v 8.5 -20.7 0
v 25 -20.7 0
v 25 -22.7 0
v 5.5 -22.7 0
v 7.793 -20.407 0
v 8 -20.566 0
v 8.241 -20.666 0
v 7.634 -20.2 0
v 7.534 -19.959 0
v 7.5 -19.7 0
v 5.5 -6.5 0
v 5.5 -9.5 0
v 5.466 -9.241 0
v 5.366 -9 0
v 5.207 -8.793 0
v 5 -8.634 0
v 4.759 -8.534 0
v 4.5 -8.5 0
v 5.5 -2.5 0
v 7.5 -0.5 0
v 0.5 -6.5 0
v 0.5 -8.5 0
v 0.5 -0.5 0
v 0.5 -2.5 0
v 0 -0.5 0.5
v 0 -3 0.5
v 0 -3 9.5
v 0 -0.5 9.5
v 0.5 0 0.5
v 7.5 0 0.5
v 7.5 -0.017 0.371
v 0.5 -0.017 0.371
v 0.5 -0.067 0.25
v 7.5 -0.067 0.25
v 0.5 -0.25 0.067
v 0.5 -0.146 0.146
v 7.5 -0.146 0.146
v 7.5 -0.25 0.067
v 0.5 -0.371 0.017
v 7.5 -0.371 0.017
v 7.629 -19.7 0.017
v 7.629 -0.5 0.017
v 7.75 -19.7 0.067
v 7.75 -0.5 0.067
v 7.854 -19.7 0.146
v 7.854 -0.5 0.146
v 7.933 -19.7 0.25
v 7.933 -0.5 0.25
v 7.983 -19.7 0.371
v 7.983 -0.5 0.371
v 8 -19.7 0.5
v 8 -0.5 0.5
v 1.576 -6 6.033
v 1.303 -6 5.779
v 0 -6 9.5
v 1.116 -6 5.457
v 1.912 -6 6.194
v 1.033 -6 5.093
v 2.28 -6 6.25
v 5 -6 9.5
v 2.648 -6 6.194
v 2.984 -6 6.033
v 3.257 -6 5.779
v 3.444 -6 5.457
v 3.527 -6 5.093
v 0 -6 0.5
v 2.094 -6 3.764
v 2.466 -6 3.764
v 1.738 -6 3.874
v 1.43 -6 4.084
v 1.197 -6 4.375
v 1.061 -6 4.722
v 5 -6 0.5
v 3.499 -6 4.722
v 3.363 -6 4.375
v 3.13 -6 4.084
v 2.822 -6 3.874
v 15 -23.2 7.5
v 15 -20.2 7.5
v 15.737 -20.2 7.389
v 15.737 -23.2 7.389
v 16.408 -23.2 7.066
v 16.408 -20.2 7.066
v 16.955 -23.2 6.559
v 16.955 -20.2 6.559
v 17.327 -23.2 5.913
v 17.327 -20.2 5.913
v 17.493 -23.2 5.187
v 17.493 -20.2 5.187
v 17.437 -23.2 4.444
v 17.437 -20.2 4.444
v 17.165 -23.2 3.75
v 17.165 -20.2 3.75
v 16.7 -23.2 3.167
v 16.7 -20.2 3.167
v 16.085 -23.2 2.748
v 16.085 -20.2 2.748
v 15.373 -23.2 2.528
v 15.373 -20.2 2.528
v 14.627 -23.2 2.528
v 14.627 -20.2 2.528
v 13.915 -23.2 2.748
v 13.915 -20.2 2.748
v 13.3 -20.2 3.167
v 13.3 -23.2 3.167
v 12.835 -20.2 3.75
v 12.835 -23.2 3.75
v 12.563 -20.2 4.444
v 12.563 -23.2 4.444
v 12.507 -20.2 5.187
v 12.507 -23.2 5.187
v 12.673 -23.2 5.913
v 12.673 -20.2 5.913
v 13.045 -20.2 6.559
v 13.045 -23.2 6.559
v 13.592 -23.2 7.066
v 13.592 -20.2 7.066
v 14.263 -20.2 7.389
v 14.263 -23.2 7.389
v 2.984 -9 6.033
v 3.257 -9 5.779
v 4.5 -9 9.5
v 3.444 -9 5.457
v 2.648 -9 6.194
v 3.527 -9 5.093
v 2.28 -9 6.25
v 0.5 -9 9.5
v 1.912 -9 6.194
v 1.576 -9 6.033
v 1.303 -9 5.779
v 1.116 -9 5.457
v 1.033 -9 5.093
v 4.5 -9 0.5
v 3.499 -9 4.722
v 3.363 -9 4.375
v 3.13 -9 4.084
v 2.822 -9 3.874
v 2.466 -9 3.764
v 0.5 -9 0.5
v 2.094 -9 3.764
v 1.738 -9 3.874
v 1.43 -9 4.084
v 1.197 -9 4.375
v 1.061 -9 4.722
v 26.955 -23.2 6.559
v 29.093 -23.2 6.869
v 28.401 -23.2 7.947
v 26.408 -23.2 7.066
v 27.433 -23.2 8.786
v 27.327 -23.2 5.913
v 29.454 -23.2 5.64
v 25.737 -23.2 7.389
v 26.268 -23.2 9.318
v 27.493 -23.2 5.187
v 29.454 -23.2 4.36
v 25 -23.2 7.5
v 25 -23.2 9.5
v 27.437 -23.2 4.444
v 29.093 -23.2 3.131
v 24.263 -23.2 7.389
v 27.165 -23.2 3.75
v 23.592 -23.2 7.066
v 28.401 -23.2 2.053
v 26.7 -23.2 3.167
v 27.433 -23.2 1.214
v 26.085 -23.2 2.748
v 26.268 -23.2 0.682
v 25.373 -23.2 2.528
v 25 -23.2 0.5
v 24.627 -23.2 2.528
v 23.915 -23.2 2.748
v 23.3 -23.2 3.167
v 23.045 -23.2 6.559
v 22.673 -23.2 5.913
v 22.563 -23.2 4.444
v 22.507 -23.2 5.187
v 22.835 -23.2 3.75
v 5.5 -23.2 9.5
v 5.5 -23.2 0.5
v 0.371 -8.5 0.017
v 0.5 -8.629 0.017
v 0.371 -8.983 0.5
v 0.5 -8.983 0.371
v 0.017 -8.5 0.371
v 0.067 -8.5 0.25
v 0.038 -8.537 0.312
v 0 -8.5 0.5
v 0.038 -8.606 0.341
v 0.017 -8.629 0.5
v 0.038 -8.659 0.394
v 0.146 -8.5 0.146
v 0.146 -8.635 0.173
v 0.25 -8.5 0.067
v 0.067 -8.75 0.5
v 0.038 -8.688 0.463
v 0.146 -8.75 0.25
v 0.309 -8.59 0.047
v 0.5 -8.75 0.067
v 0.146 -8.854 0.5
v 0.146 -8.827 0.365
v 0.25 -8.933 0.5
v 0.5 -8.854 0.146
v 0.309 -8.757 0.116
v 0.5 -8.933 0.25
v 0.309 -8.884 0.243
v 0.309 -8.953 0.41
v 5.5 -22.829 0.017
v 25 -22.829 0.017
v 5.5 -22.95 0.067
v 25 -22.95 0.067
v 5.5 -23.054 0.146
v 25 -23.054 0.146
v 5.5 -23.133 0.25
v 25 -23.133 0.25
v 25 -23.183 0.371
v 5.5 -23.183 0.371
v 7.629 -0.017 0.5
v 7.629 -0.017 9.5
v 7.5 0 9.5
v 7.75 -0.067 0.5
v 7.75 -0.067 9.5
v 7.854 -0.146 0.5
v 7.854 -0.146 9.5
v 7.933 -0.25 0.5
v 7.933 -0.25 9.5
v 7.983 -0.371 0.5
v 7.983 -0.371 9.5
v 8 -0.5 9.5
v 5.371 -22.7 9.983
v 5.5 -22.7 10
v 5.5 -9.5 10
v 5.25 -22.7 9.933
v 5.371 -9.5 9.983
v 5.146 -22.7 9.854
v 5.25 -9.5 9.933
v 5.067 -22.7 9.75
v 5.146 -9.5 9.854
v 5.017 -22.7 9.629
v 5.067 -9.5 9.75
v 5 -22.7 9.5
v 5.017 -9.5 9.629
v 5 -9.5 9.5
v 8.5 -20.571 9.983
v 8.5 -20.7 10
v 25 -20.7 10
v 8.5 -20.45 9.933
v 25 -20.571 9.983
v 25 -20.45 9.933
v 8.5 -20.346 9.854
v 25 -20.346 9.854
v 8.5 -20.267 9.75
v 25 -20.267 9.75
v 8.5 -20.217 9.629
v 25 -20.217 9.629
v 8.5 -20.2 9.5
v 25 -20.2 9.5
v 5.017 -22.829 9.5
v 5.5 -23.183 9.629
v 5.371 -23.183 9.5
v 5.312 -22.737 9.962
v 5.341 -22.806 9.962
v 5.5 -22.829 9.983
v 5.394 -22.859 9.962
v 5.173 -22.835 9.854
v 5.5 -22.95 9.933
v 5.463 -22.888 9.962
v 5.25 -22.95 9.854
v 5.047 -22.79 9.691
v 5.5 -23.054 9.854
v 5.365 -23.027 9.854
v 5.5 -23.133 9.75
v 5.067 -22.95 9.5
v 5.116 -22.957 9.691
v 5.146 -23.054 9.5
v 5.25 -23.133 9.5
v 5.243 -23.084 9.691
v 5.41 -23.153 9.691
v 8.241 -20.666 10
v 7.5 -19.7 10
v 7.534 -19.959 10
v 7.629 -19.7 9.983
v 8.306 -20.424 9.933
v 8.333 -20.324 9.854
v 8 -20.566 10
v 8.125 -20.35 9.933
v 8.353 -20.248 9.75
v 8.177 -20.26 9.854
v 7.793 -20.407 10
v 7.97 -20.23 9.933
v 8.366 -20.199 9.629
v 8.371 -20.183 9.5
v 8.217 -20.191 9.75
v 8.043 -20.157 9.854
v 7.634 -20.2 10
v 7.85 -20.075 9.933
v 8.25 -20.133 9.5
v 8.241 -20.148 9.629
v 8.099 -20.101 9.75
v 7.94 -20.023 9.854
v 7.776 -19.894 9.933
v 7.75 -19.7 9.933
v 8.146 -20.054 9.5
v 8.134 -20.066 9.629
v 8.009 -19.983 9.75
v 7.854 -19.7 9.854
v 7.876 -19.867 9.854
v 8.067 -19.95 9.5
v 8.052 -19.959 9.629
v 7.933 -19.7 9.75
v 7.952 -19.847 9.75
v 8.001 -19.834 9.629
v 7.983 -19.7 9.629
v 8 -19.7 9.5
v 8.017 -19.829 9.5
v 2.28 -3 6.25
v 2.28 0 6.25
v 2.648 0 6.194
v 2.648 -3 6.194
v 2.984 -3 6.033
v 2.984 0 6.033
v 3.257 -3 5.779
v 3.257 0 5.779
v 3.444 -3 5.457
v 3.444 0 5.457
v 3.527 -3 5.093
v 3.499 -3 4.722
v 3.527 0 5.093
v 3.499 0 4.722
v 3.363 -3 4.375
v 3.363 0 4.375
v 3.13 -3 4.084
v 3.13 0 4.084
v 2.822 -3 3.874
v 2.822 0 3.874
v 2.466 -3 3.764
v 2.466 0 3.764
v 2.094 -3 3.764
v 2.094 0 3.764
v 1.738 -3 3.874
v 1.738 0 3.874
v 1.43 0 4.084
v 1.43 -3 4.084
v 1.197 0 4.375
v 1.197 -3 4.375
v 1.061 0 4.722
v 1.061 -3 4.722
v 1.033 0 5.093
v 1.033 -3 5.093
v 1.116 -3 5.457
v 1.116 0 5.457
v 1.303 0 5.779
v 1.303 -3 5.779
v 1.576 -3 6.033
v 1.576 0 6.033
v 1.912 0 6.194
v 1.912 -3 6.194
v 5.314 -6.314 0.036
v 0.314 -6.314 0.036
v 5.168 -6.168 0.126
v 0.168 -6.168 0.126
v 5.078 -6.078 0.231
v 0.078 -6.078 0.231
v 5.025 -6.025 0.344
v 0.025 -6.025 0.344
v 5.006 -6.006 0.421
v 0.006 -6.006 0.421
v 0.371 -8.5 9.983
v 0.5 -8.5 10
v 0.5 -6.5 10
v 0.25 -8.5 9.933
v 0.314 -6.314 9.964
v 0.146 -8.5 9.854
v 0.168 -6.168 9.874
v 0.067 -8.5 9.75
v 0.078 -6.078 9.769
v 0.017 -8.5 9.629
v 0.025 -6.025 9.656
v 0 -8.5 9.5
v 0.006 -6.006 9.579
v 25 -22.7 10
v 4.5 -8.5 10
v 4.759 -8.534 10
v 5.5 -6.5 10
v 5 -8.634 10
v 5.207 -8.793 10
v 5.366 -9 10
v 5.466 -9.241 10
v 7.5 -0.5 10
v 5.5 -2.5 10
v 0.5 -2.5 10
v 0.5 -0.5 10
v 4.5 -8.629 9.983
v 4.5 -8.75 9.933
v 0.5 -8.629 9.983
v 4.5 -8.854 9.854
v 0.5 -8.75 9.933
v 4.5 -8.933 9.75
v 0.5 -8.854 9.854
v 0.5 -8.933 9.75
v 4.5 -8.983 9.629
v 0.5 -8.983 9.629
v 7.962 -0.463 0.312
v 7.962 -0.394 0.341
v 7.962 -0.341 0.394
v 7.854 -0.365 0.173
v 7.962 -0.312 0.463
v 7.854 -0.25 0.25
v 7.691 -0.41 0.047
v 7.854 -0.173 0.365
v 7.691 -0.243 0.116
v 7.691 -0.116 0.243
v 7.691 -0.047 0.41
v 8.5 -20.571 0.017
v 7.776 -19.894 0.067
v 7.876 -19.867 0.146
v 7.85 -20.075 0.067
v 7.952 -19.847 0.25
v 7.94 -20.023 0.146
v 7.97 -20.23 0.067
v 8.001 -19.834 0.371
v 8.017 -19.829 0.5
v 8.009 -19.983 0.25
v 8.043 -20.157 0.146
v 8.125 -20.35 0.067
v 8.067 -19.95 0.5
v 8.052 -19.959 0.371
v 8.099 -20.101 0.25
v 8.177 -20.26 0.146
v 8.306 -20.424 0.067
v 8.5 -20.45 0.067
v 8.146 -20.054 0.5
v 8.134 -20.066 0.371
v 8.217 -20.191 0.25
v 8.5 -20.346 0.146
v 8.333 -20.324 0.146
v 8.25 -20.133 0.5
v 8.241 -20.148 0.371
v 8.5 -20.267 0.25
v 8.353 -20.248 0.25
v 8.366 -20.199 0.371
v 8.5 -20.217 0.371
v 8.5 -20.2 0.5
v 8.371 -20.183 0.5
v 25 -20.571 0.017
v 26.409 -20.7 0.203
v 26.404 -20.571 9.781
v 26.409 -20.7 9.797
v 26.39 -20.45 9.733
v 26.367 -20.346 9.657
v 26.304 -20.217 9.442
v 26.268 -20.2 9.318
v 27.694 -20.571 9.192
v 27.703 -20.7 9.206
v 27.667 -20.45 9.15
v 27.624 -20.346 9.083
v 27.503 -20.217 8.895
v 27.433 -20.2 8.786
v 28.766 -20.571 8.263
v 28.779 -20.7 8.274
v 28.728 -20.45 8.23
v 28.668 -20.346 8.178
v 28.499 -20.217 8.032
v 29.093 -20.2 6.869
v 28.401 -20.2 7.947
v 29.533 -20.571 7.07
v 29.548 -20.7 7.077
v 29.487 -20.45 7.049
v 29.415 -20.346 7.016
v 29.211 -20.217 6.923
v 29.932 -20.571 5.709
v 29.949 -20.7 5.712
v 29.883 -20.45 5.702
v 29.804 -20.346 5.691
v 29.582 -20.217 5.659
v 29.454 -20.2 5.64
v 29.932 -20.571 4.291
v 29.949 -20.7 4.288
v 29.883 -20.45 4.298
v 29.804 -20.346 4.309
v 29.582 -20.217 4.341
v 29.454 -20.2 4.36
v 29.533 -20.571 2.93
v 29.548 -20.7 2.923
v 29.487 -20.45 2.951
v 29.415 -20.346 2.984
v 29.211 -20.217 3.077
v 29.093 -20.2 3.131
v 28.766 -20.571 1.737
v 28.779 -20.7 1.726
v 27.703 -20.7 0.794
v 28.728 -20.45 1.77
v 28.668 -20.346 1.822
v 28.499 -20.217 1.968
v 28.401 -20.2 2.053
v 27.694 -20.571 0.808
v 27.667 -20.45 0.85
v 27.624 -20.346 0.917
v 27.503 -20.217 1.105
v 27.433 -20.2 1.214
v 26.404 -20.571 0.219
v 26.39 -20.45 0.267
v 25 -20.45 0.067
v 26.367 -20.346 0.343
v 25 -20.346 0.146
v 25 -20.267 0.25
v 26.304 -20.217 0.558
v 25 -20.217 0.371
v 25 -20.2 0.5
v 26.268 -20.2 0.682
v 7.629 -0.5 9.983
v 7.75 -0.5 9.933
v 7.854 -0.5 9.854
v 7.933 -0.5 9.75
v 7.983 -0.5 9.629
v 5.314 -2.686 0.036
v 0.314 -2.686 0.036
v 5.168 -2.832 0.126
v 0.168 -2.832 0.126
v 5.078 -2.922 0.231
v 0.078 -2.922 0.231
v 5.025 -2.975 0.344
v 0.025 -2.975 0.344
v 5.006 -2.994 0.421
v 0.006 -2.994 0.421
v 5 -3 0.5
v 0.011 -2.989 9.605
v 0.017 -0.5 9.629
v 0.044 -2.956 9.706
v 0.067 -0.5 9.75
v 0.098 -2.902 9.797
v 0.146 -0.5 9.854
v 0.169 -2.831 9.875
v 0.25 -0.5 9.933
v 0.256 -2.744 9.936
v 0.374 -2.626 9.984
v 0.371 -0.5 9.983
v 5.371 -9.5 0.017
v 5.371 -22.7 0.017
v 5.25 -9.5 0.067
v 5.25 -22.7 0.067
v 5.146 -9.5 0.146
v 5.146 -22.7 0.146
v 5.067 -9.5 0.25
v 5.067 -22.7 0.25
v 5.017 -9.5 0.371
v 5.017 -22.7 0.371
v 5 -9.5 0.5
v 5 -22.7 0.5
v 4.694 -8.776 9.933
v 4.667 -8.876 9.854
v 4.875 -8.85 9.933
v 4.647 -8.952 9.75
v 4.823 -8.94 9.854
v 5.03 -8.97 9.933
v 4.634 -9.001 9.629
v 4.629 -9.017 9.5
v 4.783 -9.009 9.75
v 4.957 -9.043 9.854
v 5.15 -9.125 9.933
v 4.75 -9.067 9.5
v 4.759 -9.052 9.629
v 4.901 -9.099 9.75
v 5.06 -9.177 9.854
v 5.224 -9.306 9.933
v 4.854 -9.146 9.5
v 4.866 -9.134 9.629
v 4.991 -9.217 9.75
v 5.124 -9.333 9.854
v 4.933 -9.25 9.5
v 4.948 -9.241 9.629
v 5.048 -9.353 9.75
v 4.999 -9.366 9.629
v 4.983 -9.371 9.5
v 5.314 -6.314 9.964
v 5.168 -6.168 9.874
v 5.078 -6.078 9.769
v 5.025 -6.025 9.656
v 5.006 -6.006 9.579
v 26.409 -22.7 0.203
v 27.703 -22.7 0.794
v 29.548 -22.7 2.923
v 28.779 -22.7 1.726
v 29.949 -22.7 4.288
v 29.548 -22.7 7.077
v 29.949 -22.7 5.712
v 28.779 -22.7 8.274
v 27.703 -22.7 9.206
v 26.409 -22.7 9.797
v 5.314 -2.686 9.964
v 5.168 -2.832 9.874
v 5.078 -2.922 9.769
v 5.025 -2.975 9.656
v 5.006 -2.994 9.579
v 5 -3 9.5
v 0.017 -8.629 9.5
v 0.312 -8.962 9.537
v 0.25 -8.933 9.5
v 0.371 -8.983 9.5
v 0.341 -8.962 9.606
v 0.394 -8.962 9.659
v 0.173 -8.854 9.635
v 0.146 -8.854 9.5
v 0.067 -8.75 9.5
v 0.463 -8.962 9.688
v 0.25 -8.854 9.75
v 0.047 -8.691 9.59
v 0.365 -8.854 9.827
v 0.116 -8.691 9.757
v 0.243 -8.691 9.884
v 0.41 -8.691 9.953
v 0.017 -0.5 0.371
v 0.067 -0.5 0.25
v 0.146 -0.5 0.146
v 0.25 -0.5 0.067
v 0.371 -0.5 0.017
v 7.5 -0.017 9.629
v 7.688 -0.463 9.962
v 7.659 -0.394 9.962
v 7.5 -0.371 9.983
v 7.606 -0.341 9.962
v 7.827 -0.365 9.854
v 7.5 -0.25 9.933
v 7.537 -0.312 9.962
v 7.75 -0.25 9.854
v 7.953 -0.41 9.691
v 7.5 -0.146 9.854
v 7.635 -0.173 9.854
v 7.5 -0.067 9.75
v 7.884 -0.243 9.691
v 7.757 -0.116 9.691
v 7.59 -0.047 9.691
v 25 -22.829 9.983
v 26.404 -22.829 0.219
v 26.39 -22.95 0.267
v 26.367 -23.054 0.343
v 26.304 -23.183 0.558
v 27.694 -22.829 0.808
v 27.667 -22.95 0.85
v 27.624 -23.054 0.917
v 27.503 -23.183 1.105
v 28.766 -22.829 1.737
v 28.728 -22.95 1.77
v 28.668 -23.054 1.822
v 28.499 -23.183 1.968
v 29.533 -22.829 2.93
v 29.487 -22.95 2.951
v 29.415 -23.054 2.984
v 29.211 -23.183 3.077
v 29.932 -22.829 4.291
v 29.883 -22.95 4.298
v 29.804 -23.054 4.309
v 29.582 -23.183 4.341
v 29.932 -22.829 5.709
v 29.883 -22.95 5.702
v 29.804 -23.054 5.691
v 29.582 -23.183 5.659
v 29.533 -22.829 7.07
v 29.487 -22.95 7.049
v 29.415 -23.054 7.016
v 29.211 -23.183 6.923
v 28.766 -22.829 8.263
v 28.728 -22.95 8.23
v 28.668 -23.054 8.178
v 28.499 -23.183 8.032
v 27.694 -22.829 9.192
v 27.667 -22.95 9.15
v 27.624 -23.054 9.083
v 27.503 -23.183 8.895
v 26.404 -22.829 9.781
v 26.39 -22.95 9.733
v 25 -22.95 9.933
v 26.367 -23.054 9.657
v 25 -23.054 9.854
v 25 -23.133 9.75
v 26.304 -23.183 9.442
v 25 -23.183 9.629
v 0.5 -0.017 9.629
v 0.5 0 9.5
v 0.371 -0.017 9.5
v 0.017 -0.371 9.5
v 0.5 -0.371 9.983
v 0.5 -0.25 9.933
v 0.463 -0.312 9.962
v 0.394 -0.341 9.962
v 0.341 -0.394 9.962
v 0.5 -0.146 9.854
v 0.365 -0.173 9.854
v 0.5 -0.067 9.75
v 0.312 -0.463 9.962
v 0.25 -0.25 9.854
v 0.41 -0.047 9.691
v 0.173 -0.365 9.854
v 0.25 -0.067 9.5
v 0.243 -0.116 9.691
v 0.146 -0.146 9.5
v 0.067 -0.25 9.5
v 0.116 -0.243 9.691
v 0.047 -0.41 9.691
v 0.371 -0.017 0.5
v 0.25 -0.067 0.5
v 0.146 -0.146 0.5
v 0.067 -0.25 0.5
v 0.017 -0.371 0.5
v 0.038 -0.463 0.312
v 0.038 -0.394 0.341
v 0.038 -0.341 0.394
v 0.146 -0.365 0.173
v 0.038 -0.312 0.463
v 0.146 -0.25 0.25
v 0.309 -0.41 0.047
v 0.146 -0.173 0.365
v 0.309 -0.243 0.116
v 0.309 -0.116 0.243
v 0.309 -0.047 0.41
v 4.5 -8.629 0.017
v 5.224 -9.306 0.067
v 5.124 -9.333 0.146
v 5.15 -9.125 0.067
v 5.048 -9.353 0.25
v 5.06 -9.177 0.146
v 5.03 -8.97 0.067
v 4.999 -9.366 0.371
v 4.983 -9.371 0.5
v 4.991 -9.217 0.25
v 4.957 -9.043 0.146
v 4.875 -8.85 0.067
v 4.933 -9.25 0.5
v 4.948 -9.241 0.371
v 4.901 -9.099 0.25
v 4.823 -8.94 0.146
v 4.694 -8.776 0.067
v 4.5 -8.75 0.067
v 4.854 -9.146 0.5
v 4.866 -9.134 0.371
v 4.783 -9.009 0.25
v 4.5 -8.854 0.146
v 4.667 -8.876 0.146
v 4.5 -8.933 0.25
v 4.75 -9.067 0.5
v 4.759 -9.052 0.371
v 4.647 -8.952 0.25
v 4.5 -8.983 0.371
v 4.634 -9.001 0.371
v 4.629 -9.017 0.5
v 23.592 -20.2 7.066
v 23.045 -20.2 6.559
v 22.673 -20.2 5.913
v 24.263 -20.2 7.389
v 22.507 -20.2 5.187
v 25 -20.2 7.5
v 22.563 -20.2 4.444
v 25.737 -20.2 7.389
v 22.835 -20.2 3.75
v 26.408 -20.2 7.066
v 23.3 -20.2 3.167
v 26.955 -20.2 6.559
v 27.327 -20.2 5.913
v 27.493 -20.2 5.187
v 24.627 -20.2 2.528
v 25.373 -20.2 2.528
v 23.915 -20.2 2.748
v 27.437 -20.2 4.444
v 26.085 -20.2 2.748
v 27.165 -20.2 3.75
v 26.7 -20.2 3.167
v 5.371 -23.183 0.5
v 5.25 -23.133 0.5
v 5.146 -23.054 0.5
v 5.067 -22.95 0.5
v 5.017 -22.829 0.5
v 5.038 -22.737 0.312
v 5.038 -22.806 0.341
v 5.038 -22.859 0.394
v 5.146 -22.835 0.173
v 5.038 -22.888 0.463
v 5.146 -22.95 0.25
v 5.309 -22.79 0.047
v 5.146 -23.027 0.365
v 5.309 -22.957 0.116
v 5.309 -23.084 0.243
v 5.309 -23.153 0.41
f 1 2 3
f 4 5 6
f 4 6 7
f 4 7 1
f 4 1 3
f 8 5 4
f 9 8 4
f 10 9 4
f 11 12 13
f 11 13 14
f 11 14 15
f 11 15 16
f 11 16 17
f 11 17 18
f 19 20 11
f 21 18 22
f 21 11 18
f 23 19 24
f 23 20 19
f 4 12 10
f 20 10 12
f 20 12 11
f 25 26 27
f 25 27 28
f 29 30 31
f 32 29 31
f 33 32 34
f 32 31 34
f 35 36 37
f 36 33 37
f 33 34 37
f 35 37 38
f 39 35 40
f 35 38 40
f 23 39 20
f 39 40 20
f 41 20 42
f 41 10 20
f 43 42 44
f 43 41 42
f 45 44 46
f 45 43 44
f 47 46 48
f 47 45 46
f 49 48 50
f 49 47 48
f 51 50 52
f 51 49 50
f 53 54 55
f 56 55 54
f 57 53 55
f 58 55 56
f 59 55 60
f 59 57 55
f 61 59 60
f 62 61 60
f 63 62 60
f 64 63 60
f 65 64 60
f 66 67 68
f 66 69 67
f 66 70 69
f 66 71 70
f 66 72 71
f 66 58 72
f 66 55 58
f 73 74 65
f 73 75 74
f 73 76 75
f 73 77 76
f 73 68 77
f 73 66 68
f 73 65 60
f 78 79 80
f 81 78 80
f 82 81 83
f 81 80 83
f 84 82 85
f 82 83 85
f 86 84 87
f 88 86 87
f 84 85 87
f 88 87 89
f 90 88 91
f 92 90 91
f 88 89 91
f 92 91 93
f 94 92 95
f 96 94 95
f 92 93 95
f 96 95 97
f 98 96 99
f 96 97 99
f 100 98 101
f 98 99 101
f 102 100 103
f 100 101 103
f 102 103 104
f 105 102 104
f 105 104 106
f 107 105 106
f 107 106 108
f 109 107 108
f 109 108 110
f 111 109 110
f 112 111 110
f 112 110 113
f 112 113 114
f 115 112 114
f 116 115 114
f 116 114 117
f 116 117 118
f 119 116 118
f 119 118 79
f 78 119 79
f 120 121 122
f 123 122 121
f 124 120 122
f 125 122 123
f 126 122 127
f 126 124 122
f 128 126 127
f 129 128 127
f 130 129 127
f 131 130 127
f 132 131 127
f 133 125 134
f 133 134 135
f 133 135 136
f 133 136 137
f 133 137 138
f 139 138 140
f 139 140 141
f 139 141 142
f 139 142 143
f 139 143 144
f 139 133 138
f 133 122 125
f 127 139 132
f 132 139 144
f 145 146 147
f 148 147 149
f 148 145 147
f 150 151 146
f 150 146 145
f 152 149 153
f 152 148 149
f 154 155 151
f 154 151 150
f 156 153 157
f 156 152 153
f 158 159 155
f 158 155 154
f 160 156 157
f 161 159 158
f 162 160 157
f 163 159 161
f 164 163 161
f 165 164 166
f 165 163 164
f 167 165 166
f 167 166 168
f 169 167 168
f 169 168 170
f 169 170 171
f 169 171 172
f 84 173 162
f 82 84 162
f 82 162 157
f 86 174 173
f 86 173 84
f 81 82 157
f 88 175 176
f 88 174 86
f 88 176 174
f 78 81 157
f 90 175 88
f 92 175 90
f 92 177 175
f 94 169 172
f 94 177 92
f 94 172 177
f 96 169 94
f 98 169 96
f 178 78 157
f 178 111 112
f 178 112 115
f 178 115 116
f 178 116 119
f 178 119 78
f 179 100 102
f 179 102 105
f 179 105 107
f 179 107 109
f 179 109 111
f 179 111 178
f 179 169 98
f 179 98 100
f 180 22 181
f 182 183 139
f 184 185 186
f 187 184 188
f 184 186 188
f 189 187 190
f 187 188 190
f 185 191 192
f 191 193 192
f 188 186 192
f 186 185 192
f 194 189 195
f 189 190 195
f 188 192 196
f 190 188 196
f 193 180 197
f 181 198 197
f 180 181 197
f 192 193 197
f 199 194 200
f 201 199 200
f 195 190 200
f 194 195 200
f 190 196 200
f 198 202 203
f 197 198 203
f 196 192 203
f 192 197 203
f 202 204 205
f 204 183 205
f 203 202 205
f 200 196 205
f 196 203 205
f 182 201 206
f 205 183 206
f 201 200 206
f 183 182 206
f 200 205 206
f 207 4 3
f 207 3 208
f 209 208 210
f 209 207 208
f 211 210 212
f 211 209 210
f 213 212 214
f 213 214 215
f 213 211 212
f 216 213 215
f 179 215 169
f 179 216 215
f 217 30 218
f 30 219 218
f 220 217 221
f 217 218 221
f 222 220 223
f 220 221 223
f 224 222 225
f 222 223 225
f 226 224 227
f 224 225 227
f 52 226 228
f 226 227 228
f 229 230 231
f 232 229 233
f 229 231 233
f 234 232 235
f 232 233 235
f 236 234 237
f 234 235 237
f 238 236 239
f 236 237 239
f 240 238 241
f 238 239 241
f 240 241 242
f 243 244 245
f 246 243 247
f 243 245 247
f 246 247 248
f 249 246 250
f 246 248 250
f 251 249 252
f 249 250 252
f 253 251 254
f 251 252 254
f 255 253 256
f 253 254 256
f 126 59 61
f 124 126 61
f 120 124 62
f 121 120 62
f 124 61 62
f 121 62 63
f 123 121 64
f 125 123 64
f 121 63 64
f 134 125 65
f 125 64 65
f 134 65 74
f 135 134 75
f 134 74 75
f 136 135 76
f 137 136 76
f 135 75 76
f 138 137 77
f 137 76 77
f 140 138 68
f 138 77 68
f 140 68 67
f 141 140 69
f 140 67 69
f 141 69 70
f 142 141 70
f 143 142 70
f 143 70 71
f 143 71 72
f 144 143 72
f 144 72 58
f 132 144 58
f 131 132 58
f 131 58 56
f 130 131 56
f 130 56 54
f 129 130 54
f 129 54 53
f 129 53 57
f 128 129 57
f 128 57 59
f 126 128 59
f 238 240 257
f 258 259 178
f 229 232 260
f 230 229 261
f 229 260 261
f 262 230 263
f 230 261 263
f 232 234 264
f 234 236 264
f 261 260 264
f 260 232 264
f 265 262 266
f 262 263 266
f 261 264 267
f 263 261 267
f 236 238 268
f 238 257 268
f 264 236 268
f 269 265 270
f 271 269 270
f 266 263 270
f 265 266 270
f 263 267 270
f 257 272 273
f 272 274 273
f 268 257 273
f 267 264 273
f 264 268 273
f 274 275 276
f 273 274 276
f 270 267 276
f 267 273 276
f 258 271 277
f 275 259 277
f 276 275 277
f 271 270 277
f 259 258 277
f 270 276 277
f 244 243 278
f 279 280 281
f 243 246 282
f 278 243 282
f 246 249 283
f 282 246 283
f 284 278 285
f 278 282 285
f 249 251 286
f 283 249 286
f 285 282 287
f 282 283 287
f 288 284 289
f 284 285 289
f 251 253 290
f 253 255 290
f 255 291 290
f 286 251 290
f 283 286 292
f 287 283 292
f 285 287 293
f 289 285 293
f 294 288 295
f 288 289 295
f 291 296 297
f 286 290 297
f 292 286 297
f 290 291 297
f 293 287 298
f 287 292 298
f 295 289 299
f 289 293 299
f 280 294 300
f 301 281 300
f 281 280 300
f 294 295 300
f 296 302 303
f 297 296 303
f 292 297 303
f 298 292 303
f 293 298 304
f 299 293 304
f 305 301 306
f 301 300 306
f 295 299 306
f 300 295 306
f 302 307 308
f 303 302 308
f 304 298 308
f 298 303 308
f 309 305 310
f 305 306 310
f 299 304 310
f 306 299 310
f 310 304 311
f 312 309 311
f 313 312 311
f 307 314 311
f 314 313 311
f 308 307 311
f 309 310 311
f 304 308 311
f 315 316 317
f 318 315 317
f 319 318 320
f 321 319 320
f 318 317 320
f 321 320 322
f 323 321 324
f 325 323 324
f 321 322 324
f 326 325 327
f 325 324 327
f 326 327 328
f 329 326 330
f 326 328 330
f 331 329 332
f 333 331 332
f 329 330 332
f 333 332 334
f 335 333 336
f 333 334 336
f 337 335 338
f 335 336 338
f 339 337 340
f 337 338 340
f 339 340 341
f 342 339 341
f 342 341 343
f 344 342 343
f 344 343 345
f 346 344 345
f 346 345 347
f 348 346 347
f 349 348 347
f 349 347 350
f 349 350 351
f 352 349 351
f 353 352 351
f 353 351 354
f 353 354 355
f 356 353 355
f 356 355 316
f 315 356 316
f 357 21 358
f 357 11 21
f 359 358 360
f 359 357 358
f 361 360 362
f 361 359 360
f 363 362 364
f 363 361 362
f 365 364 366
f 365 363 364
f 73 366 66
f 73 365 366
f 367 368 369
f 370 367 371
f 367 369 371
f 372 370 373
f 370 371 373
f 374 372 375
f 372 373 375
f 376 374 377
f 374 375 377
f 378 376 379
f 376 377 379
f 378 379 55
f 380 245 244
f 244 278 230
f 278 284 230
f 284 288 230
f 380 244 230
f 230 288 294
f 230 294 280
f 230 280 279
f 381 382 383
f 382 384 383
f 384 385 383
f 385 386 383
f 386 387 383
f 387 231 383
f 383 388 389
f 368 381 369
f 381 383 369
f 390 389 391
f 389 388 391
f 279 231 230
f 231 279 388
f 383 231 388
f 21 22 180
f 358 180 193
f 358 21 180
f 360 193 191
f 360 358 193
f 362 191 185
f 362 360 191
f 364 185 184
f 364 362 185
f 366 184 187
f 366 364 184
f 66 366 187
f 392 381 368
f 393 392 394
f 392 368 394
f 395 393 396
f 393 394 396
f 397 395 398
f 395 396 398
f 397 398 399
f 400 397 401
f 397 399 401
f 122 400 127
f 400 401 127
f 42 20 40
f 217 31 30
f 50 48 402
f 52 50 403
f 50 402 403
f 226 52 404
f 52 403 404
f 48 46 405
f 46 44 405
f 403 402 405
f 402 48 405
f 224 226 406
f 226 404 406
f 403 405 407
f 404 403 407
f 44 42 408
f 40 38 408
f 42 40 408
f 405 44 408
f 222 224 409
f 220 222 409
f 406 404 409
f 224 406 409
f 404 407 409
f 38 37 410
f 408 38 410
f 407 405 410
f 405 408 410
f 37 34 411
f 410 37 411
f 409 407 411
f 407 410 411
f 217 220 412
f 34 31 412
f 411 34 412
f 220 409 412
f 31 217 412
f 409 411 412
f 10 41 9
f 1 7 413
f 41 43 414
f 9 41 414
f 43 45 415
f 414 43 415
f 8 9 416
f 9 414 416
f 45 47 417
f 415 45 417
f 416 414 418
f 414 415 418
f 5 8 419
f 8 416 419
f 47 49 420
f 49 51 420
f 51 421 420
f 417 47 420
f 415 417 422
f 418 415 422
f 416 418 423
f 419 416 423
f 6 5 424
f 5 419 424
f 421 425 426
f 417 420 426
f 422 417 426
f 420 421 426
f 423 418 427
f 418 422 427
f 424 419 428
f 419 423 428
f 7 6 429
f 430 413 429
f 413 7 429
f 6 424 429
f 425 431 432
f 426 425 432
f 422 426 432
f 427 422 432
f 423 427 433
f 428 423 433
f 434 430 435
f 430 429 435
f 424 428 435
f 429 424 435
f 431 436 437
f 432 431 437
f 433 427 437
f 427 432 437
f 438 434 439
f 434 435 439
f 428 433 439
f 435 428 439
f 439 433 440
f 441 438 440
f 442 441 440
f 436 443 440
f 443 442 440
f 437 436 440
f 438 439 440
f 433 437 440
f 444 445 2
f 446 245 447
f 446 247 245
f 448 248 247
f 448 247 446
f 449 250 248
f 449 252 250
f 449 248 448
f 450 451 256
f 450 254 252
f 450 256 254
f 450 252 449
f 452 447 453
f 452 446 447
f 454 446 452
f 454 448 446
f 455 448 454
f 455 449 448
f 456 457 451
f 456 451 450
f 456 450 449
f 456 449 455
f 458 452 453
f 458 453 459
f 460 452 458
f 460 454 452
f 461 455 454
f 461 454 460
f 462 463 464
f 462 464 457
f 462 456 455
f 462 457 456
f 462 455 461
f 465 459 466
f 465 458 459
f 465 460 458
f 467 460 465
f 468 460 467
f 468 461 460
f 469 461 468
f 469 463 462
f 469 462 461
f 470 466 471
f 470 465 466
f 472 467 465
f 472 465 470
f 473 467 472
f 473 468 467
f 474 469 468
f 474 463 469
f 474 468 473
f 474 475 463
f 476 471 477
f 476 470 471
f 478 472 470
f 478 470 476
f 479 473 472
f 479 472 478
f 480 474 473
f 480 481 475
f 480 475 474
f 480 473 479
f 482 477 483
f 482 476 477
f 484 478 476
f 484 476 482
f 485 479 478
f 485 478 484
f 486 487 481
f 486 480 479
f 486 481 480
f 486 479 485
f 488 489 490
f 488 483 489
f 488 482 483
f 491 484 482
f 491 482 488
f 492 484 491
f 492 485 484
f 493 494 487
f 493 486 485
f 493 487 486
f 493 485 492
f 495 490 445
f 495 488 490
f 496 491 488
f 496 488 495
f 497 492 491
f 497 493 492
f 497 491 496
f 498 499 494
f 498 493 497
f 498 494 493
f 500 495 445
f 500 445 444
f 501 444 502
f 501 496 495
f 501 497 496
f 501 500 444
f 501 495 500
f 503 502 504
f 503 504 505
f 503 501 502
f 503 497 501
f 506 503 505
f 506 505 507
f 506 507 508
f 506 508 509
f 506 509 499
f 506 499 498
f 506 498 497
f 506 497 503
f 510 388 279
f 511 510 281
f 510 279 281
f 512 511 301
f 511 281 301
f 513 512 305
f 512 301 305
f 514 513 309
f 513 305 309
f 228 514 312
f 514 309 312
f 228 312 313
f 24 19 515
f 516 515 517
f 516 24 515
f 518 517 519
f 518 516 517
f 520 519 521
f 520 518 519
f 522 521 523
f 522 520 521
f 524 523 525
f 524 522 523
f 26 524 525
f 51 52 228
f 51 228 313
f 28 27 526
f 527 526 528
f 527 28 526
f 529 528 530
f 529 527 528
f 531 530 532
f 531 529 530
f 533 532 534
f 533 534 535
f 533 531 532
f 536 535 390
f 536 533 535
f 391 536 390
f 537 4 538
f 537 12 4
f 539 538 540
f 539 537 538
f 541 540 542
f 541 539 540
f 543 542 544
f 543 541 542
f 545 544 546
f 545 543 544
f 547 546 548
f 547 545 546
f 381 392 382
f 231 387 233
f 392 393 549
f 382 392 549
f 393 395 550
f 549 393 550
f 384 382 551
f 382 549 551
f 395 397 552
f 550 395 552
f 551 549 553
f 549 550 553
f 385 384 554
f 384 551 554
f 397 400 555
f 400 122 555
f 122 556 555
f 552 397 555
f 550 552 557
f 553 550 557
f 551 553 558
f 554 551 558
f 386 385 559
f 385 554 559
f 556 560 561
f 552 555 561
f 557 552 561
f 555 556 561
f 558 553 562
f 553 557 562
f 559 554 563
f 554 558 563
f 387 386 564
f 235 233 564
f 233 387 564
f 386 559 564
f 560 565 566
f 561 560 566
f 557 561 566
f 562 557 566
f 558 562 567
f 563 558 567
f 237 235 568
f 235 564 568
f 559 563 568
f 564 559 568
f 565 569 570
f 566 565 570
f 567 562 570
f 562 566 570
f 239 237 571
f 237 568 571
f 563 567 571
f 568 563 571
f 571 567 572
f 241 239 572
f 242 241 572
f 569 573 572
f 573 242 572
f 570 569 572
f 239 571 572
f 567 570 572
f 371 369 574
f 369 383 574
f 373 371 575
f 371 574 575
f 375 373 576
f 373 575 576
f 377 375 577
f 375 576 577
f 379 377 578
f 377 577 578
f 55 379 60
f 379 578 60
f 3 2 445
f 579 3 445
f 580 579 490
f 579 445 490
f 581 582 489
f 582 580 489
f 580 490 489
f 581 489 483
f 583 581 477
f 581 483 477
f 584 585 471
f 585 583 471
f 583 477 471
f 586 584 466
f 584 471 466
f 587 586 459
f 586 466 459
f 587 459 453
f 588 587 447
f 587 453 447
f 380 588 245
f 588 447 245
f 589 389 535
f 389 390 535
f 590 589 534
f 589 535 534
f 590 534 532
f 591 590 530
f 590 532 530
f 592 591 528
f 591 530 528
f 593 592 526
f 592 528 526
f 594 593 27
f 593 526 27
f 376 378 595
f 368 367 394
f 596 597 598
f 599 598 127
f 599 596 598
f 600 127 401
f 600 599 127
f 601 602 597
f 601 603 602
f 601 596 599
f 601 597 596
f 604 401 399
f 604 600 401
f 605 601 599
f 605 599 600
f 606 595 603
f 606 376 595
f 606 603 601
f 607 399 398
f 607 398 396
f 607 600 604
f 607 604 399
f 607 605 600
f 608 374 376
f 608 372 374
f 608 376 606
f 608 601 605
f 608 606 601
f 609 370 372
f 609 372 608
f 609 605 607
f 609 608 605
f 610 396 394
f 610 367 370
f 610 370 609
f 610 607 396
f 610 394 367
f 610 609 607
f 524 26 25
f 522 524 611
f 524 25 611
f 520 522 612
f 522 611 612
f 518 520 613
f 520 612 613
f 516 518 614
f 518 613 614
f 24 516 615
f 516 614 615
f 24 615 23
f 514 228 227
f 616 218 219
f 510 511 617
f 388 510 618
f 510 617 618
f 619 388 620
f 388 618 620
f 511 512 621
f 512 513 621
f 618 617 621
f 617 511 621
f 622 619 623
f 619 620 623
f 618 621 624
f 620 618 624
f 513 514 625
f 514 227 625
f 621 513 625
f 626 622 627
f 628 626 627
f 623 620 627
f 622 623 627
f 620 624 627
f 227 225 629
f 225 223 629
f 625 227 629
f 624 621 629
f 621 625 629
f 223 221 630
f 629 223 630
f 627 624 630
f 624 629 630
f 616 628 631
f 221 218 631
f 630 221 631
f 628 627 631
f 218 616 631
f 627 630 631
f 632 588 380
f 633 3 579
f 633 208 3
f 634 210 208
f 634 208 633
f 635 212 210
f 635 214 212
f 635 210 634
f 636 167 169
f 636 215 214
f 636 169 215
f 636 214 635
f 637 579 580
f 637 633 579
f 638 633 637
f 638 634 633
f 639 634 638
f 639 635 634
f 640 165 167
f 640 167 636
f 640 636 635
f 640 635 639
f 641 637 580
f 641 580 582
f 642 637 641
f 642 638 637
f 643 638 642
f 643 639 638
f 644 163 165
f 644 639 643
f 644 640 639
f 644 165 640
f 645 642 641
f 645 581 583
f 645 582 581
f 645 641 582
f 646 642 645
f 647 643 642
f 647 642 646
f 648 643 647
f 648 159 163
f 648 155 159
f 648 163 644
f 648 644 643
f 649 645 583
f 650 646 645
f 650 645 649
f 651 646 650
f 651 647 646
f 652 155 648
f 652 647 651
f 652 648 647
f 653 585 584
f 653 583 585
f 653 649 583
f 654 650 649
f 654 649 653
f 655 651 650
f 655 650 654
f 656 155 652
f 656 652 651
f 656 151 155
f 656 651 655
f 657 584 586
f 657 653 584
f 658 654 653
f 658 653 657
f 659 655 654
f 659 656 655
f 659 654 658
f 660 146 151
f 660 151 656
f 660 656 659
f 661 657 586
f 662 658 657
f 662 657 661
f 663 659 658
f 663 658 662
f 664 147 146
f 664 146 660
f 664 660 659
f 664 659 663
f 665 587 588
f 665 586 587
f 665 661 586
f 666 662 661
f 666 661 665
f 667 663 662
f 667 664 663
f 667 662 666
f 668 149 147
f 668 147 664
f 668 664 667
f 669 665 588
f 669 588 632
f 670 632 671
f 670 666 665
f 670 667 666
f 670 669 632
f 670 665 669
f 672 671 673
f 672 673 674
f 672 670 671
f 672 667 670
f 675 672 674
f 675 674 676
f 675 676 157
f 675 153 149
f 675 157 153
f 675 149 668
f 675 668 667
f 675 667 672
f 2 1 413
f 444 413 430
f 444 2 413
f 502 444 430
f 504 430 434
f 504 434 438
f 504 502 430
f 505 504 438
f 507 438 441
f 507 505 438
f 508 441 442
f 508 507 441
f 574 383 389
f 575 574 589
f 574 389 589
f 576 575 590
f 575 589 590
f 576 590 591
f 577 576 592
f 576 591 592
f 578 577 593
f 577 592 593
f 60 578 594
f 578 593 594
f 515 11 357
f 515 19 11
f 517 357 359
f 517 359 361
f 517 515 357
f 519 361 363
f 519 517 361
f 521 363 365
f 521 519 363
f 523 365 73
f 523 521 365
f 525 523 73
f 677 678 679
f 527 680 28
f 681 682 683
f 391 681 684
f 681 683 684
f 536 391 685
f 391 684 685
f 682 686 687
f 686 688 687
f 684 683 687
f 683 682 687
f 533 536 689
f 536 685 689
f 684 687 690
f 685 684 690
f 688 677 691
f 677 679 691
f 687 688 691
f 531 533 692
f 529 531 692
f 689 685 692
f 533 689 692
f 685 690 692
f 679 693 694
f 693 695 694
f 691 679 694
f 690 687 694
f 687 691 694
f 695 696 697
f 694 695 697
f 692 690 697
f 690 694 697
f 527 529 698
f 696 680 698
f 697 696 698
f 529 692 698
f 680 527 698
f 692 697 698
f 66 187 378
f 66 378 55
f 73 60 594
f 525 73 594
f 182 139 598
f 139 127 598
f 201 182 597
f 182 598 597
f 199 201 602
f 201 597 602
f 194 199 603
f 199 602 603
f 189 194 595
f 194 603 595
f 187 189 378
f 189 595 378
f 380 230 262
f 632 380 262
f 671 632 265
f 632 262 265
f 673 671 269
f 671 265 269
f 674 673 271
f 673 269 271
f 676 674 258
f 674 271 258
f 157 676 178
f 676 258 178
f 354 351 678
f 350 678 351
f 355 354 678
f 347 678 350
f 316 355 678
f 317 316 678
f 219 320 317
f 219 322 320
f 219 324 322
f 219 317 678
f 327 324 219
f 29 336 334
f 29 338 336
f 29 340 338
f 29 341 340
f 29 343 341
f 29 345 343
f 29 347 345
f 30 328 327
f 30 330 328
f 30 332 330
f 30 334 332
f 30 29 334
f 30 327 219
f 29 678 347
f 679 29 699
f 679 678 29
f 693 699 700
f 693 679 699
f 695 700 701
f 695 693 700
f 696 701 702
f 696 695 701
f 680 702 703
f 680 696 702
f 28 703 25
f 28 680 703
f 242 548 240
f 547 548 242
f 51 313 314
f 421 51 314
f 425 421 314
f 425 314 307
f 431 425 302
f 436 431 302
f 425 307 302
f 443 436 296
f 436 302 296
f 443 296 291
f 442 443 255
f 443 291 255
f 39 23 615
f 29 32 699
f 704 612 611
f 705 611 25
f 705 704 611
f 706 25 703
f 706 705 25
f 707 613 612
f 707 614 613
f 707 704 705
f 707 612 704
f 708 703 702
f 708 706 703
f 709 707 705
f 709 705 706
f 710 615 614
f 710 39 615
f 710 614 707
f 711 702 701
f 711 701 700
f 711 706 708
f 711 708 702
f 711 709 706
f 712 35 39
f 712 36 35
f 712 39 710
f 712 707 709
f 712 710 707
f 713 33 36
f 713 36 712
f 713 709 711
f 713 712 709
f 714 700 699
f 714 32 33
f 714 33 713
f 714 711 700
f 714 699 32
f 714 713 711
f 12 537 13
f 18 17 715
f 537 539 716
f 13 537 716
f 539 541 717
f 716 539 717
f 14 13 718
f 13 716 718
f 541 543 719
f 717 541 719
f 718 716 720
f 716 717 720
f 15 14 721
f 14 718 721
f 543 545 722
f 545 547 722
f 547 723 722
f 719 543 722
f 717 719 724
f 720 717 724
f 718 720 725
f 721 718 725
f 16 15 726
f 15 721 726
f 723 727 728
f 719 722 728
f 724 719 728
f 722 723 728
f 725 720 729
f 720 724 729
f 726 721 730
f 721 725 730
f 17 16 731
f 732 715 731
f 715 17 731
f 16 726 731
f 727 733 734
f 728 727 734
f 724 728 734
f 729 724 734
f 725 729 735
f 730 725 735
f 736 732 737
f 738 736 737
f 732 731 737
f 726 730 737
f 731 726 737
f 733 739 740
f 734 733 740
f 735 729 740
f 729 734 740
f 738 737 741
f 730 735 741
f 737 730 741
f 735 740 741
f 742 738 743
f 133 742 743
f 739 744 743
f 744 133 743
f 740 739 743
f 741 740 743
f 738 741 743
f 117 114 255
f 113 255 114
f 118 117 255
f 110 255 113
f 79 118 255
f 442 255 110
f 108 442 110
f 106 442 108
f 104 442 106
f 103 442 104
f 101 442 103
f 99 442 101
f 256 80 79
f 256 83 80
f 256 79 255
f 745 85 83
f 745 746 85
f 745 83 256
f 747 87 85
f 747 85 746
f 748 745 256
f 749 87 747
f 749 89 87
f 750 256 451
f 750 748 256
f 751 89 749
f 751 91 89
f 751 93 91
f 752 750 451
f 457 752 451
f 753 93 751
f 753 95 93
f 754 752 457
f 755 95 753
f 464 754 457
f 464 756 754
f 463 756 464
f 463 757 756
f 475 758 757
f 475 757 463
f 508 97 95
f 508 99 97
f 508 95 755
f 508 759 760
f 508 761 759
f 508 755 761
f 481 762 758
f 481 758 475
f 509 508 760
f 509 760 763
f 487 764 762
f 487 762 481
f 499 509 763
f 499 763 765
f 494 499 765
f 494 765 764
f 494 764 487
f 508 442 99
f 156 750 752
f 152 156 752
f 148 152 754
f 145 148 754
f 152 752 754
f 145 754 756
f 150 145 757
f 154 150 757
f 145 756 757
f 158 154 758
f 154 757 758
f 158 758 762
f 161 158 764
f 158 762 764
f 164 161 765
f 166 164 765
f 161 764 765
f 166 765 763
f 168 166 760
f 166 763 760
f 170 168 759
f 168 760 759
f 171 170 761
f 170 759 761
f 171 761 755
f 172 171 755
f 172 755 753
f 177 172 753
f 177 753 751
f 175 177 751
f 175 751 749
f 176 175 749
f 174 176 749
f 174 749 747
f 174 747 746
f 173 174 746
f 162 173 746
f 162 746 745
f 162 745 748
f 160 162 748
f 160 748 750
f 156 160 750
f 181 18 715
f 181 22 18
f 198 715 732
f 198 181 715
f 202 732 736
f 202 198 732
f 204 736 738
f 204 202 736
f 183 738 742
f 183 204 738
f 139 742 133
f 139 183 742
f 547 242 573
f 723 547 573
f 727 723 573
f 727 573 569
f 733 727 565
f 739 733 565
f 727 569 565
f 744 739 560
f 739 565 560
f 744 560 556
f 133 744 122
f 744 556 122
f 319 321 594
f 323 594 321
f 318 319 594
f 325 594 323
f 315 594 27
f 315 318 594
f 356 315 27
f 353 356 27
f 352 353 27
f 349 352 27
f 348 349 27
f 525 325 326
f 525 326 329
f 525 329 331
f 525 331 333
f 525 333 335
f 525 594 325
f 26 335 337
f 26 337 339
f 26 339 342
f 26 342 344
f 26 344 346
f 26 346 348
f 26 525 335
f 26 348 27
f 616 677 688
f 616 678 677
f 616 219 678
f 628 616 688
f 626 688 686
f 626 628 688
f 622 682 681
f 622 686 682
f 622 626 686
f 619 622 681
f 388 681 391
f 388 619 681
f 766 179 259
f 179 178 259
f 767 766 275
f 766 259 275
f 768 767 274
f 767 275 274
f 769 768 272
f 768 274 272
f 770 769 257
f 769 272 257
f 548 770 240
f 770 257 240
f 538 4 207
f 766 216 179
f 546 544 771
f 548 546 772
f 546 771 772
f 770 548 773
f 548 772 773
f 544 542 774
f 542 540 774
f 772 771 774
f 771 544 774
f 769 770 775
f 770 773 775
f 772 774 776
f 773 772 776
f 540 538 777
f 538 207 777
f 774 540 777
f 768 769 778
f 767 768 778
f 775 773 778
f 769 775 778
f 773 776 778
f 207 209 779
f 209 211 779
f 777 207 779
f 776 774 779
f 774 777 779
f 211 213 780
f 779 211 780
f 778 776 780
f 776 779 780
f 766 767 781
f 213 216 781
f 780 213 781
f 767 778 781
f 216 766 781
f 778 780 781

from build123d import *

# Parameters (mm, degrees)
BOSS_EXTRUDE1_DEPTH = 10
SKETCH2_R           = 1.25
CUT_EXTRUDE1_DEPTH  = 40.220402854
CUT_EXTRUDE2_REACH  = 39.524
SKETCH3_R           = 2.5
FILLET1_R           = 0.5
FILLET2_R           = 5


with BuildPart() as part:
    # Sketch1 → Boss-Extrude1 (new body)
    with BuildSketch(Plane.XY):
        Polygon((0, 0), (8, 0), (8, -20.2), (30, -20.2), (30, -23.2), (5, -23.2), (5, -9), (0, -9), (0, -6), (5, -6), (5, -3), (0, -3), align=None)
    extrude(amount=BOSS_EXTRUDE1_DEPTH)

    # Sketch2 → Cut-Extrude1 (cut, through all)
    with BuildSketch(Plane(origin=(0, 0, 0), x_dir=(1, 0, 0), z_dir=(0, 1, 0))):
        with Locations(Location((2.28, -5, 0), (0, 0, 270))):
            Circle(SKETCH2_R)
    extrude(amount=-CUT_EXTRUDE1_DEPTH, mode=Mode.SUBTRACT)

    # Sketch3 → Cut-Extrude2 (cut, up to next)
    with BuildSketch(Plane(origin=(0, -20.2, 0), x_dir=(1, 0, 0), z_dir=(0, 1, 0)), mode=Mode.PRIVATE) as cut_extrude2_sk1:
        with Locations(Location((25, -5, 0), (0, 0, 270))):
            Circle(SKETCH3_R)
    cut_extrude2_tool1 = extrude(cut_extrude2_sk1.sketch, amount=-CUT_EXTRUDE2_REACH, mode=Mode.PRIVATE) & part.part
    # Sketch3 → Cut-Extrude2 (cut, up to next)
    with BuildSketch(Plane(origin=(0, -20.2, 0), x_dir=(1, 0, 0), z_dir=(0, 1, 0)), mode=Mode.PRIVATE) as cut_extrude2_sk2:
        with Locations(Location((15, -5, 0), (0, 0, 270))):
            Circle(SKETCH3_R)
    cut_extrude2_tool2 = extrude(cut_extrude2_sk2.sketch, amount=-CUT_EXTRUDE2_REACH, mode=Mode.PRIVATE) & part.part
    add(cut_extrude2_tool1.solids().sort_by_distance((25, -20.2, 5))[0], mode=Mode.SUBTRACT)
    add(cut_extrude2_tool2.solids().sort_by_distance((15, -20.2, 5))[0], mode=Mode.SUBTRACT)

    # Fillet1
    fillet1_edges = [part.edges().sort_by_distance(p)[0] for p in [
        (4, 0, 0),
        (8, -10.1, 0),
        (5, -4.5, 10),
        (19, -20.2, 0),
        (17.5, -23.2, 0),
        (5, -16.1, 0),
        (2.5, -9, 0),
        (0, -7.5, 0),
        (2.5, -6, 0),
        (5, -4.5, 0),
        (2.5, -3, 0),
        (0, -1.5, 0),
        (2.5, -6, 10),
        (0, 0, 5),
        (8, 0, 5),
        (8, -20.2, 5),
        (0, -7.5, 10),
        (30, -20.2, 5),
        (30, -23.2, 5),
        (5, -23.2, 5),
        (5, -9, 5),
        (0, -9, 5),
        (2.5, -9, 10),
        (5, -16.1, 10),
        (17.5, -23.2, 10),
        (19, -20.2, 10),
        (8, -10.1, 10),
        (4, 0, 10),
        (0, -1.5, 10),
        (2.5, -3, 10),
    ]]
    fillet(fillet1_edges, radius=FILLET1_R)

    # Fillet2
    # the kernel refuses this fillet: 5 mm, written as the material it takes off along each edge
    with BuildSketch(Plane(origin=(25, -20.2, 5), x_dir=(1, 0, 0), z_dir=(0, 0, 1))) as fillet2_piece_1:
        with BuildLine():
            CenterArc((4.5, -0.5), 0.5, 0, 90)
            Line((5, -0.5), (5, 0))
            Line((5, 0), (4.5, 0))
        make_face()
    revolve(axis=Axis((25, -20.2, 5), (0, 1, 0)), revolution_arc=90, mode=Mode.SUBTRACT)
    with BuildSketch(Plane(origin=(25, -23.2, 5), x_dir=(0, 0, -1), z_dir=(-1, 0, 0))) as fillet2_piece_2:
        with BuildLine():
            CenterArc((4.5, -0.5), 0.5, 0, 90)
            Line((5, -0.5), (5, 0))
            Line((5, 0), (4.5, 0))
        make_face()
    revolve(axis=Axis((25, -23.2, 5), (0, -1, 0)), revolution_arc=90, mode=Mode.SUBTRACT)
    with BuildSketch(Plane(origin=(25, -20.2, 5), x_dir=(0, 0, 1), z_dir=(-1, 0, 0))) as fillet2_piece_3:
        with BuildLine():
            CenterArc((4.5, -0.5), 0.5, 0, 90)
            Line((5, -0.5), (5, 0))
            Line((5, 0), (4.5, 0))
        make_face()
    revolve(axis=Axis((25, -20.2, 5), (0, 1, 0)), revolution_arc=90, mode=Mode.SUBTRACT)
    with BuildSketch(Plane(origin=(25, -23.2, 5), x_dir=(1, 0, 0), z_dir=(0, 0, -1))) as fillet2_piece_4:
        with BuildLine():
            CenterArc((4.5, -0.5), 0.5, 0, 90)
            Line((5, -0.5), (5, 0))
            Line((5, 0), (4.5, 0))
        make_face()
    revolve(axis=Axis((25, -23.2, 5), (0, -1, 0)), revolution_arc=90, mode=Mode.SUBTRACT)
    with BuildSketch(Plane(origin=(30, -20.2, 10), x_dir=(-1, 0, 0), z_dir=(0, -1, 0))) as fillet2_piece_5:
        with BuildLine():
            CenterArc((FILLET2_R, FILLET2_R), FILLET2_R, 180, 90)
            Line((0, FILLET2_R), (0, 0))
            Line((0, 0), (FILLET2_R, 0))
        make_face()
    extrude(amount=3, mode=Mode.SUBTRACT)
    with BuildSketch(Plane(origin=(30, -20.2, 0), x_dir=(-1, 0, 0), z_dir=(0, -1, 0))) as fillet2_piece_6:
        with BuildLine():
            CenterArc((FILLET2_R, -FILLET2_R), FILLET2_R, 90, 90)
            Line((0, -FILLET2_R), (0, 0))
            Line((0, 0), (FILLET2_R, 0))
        make_face()
    extrude(amount=3, mode=Mode.SUBTRACT)


solid = part.part
